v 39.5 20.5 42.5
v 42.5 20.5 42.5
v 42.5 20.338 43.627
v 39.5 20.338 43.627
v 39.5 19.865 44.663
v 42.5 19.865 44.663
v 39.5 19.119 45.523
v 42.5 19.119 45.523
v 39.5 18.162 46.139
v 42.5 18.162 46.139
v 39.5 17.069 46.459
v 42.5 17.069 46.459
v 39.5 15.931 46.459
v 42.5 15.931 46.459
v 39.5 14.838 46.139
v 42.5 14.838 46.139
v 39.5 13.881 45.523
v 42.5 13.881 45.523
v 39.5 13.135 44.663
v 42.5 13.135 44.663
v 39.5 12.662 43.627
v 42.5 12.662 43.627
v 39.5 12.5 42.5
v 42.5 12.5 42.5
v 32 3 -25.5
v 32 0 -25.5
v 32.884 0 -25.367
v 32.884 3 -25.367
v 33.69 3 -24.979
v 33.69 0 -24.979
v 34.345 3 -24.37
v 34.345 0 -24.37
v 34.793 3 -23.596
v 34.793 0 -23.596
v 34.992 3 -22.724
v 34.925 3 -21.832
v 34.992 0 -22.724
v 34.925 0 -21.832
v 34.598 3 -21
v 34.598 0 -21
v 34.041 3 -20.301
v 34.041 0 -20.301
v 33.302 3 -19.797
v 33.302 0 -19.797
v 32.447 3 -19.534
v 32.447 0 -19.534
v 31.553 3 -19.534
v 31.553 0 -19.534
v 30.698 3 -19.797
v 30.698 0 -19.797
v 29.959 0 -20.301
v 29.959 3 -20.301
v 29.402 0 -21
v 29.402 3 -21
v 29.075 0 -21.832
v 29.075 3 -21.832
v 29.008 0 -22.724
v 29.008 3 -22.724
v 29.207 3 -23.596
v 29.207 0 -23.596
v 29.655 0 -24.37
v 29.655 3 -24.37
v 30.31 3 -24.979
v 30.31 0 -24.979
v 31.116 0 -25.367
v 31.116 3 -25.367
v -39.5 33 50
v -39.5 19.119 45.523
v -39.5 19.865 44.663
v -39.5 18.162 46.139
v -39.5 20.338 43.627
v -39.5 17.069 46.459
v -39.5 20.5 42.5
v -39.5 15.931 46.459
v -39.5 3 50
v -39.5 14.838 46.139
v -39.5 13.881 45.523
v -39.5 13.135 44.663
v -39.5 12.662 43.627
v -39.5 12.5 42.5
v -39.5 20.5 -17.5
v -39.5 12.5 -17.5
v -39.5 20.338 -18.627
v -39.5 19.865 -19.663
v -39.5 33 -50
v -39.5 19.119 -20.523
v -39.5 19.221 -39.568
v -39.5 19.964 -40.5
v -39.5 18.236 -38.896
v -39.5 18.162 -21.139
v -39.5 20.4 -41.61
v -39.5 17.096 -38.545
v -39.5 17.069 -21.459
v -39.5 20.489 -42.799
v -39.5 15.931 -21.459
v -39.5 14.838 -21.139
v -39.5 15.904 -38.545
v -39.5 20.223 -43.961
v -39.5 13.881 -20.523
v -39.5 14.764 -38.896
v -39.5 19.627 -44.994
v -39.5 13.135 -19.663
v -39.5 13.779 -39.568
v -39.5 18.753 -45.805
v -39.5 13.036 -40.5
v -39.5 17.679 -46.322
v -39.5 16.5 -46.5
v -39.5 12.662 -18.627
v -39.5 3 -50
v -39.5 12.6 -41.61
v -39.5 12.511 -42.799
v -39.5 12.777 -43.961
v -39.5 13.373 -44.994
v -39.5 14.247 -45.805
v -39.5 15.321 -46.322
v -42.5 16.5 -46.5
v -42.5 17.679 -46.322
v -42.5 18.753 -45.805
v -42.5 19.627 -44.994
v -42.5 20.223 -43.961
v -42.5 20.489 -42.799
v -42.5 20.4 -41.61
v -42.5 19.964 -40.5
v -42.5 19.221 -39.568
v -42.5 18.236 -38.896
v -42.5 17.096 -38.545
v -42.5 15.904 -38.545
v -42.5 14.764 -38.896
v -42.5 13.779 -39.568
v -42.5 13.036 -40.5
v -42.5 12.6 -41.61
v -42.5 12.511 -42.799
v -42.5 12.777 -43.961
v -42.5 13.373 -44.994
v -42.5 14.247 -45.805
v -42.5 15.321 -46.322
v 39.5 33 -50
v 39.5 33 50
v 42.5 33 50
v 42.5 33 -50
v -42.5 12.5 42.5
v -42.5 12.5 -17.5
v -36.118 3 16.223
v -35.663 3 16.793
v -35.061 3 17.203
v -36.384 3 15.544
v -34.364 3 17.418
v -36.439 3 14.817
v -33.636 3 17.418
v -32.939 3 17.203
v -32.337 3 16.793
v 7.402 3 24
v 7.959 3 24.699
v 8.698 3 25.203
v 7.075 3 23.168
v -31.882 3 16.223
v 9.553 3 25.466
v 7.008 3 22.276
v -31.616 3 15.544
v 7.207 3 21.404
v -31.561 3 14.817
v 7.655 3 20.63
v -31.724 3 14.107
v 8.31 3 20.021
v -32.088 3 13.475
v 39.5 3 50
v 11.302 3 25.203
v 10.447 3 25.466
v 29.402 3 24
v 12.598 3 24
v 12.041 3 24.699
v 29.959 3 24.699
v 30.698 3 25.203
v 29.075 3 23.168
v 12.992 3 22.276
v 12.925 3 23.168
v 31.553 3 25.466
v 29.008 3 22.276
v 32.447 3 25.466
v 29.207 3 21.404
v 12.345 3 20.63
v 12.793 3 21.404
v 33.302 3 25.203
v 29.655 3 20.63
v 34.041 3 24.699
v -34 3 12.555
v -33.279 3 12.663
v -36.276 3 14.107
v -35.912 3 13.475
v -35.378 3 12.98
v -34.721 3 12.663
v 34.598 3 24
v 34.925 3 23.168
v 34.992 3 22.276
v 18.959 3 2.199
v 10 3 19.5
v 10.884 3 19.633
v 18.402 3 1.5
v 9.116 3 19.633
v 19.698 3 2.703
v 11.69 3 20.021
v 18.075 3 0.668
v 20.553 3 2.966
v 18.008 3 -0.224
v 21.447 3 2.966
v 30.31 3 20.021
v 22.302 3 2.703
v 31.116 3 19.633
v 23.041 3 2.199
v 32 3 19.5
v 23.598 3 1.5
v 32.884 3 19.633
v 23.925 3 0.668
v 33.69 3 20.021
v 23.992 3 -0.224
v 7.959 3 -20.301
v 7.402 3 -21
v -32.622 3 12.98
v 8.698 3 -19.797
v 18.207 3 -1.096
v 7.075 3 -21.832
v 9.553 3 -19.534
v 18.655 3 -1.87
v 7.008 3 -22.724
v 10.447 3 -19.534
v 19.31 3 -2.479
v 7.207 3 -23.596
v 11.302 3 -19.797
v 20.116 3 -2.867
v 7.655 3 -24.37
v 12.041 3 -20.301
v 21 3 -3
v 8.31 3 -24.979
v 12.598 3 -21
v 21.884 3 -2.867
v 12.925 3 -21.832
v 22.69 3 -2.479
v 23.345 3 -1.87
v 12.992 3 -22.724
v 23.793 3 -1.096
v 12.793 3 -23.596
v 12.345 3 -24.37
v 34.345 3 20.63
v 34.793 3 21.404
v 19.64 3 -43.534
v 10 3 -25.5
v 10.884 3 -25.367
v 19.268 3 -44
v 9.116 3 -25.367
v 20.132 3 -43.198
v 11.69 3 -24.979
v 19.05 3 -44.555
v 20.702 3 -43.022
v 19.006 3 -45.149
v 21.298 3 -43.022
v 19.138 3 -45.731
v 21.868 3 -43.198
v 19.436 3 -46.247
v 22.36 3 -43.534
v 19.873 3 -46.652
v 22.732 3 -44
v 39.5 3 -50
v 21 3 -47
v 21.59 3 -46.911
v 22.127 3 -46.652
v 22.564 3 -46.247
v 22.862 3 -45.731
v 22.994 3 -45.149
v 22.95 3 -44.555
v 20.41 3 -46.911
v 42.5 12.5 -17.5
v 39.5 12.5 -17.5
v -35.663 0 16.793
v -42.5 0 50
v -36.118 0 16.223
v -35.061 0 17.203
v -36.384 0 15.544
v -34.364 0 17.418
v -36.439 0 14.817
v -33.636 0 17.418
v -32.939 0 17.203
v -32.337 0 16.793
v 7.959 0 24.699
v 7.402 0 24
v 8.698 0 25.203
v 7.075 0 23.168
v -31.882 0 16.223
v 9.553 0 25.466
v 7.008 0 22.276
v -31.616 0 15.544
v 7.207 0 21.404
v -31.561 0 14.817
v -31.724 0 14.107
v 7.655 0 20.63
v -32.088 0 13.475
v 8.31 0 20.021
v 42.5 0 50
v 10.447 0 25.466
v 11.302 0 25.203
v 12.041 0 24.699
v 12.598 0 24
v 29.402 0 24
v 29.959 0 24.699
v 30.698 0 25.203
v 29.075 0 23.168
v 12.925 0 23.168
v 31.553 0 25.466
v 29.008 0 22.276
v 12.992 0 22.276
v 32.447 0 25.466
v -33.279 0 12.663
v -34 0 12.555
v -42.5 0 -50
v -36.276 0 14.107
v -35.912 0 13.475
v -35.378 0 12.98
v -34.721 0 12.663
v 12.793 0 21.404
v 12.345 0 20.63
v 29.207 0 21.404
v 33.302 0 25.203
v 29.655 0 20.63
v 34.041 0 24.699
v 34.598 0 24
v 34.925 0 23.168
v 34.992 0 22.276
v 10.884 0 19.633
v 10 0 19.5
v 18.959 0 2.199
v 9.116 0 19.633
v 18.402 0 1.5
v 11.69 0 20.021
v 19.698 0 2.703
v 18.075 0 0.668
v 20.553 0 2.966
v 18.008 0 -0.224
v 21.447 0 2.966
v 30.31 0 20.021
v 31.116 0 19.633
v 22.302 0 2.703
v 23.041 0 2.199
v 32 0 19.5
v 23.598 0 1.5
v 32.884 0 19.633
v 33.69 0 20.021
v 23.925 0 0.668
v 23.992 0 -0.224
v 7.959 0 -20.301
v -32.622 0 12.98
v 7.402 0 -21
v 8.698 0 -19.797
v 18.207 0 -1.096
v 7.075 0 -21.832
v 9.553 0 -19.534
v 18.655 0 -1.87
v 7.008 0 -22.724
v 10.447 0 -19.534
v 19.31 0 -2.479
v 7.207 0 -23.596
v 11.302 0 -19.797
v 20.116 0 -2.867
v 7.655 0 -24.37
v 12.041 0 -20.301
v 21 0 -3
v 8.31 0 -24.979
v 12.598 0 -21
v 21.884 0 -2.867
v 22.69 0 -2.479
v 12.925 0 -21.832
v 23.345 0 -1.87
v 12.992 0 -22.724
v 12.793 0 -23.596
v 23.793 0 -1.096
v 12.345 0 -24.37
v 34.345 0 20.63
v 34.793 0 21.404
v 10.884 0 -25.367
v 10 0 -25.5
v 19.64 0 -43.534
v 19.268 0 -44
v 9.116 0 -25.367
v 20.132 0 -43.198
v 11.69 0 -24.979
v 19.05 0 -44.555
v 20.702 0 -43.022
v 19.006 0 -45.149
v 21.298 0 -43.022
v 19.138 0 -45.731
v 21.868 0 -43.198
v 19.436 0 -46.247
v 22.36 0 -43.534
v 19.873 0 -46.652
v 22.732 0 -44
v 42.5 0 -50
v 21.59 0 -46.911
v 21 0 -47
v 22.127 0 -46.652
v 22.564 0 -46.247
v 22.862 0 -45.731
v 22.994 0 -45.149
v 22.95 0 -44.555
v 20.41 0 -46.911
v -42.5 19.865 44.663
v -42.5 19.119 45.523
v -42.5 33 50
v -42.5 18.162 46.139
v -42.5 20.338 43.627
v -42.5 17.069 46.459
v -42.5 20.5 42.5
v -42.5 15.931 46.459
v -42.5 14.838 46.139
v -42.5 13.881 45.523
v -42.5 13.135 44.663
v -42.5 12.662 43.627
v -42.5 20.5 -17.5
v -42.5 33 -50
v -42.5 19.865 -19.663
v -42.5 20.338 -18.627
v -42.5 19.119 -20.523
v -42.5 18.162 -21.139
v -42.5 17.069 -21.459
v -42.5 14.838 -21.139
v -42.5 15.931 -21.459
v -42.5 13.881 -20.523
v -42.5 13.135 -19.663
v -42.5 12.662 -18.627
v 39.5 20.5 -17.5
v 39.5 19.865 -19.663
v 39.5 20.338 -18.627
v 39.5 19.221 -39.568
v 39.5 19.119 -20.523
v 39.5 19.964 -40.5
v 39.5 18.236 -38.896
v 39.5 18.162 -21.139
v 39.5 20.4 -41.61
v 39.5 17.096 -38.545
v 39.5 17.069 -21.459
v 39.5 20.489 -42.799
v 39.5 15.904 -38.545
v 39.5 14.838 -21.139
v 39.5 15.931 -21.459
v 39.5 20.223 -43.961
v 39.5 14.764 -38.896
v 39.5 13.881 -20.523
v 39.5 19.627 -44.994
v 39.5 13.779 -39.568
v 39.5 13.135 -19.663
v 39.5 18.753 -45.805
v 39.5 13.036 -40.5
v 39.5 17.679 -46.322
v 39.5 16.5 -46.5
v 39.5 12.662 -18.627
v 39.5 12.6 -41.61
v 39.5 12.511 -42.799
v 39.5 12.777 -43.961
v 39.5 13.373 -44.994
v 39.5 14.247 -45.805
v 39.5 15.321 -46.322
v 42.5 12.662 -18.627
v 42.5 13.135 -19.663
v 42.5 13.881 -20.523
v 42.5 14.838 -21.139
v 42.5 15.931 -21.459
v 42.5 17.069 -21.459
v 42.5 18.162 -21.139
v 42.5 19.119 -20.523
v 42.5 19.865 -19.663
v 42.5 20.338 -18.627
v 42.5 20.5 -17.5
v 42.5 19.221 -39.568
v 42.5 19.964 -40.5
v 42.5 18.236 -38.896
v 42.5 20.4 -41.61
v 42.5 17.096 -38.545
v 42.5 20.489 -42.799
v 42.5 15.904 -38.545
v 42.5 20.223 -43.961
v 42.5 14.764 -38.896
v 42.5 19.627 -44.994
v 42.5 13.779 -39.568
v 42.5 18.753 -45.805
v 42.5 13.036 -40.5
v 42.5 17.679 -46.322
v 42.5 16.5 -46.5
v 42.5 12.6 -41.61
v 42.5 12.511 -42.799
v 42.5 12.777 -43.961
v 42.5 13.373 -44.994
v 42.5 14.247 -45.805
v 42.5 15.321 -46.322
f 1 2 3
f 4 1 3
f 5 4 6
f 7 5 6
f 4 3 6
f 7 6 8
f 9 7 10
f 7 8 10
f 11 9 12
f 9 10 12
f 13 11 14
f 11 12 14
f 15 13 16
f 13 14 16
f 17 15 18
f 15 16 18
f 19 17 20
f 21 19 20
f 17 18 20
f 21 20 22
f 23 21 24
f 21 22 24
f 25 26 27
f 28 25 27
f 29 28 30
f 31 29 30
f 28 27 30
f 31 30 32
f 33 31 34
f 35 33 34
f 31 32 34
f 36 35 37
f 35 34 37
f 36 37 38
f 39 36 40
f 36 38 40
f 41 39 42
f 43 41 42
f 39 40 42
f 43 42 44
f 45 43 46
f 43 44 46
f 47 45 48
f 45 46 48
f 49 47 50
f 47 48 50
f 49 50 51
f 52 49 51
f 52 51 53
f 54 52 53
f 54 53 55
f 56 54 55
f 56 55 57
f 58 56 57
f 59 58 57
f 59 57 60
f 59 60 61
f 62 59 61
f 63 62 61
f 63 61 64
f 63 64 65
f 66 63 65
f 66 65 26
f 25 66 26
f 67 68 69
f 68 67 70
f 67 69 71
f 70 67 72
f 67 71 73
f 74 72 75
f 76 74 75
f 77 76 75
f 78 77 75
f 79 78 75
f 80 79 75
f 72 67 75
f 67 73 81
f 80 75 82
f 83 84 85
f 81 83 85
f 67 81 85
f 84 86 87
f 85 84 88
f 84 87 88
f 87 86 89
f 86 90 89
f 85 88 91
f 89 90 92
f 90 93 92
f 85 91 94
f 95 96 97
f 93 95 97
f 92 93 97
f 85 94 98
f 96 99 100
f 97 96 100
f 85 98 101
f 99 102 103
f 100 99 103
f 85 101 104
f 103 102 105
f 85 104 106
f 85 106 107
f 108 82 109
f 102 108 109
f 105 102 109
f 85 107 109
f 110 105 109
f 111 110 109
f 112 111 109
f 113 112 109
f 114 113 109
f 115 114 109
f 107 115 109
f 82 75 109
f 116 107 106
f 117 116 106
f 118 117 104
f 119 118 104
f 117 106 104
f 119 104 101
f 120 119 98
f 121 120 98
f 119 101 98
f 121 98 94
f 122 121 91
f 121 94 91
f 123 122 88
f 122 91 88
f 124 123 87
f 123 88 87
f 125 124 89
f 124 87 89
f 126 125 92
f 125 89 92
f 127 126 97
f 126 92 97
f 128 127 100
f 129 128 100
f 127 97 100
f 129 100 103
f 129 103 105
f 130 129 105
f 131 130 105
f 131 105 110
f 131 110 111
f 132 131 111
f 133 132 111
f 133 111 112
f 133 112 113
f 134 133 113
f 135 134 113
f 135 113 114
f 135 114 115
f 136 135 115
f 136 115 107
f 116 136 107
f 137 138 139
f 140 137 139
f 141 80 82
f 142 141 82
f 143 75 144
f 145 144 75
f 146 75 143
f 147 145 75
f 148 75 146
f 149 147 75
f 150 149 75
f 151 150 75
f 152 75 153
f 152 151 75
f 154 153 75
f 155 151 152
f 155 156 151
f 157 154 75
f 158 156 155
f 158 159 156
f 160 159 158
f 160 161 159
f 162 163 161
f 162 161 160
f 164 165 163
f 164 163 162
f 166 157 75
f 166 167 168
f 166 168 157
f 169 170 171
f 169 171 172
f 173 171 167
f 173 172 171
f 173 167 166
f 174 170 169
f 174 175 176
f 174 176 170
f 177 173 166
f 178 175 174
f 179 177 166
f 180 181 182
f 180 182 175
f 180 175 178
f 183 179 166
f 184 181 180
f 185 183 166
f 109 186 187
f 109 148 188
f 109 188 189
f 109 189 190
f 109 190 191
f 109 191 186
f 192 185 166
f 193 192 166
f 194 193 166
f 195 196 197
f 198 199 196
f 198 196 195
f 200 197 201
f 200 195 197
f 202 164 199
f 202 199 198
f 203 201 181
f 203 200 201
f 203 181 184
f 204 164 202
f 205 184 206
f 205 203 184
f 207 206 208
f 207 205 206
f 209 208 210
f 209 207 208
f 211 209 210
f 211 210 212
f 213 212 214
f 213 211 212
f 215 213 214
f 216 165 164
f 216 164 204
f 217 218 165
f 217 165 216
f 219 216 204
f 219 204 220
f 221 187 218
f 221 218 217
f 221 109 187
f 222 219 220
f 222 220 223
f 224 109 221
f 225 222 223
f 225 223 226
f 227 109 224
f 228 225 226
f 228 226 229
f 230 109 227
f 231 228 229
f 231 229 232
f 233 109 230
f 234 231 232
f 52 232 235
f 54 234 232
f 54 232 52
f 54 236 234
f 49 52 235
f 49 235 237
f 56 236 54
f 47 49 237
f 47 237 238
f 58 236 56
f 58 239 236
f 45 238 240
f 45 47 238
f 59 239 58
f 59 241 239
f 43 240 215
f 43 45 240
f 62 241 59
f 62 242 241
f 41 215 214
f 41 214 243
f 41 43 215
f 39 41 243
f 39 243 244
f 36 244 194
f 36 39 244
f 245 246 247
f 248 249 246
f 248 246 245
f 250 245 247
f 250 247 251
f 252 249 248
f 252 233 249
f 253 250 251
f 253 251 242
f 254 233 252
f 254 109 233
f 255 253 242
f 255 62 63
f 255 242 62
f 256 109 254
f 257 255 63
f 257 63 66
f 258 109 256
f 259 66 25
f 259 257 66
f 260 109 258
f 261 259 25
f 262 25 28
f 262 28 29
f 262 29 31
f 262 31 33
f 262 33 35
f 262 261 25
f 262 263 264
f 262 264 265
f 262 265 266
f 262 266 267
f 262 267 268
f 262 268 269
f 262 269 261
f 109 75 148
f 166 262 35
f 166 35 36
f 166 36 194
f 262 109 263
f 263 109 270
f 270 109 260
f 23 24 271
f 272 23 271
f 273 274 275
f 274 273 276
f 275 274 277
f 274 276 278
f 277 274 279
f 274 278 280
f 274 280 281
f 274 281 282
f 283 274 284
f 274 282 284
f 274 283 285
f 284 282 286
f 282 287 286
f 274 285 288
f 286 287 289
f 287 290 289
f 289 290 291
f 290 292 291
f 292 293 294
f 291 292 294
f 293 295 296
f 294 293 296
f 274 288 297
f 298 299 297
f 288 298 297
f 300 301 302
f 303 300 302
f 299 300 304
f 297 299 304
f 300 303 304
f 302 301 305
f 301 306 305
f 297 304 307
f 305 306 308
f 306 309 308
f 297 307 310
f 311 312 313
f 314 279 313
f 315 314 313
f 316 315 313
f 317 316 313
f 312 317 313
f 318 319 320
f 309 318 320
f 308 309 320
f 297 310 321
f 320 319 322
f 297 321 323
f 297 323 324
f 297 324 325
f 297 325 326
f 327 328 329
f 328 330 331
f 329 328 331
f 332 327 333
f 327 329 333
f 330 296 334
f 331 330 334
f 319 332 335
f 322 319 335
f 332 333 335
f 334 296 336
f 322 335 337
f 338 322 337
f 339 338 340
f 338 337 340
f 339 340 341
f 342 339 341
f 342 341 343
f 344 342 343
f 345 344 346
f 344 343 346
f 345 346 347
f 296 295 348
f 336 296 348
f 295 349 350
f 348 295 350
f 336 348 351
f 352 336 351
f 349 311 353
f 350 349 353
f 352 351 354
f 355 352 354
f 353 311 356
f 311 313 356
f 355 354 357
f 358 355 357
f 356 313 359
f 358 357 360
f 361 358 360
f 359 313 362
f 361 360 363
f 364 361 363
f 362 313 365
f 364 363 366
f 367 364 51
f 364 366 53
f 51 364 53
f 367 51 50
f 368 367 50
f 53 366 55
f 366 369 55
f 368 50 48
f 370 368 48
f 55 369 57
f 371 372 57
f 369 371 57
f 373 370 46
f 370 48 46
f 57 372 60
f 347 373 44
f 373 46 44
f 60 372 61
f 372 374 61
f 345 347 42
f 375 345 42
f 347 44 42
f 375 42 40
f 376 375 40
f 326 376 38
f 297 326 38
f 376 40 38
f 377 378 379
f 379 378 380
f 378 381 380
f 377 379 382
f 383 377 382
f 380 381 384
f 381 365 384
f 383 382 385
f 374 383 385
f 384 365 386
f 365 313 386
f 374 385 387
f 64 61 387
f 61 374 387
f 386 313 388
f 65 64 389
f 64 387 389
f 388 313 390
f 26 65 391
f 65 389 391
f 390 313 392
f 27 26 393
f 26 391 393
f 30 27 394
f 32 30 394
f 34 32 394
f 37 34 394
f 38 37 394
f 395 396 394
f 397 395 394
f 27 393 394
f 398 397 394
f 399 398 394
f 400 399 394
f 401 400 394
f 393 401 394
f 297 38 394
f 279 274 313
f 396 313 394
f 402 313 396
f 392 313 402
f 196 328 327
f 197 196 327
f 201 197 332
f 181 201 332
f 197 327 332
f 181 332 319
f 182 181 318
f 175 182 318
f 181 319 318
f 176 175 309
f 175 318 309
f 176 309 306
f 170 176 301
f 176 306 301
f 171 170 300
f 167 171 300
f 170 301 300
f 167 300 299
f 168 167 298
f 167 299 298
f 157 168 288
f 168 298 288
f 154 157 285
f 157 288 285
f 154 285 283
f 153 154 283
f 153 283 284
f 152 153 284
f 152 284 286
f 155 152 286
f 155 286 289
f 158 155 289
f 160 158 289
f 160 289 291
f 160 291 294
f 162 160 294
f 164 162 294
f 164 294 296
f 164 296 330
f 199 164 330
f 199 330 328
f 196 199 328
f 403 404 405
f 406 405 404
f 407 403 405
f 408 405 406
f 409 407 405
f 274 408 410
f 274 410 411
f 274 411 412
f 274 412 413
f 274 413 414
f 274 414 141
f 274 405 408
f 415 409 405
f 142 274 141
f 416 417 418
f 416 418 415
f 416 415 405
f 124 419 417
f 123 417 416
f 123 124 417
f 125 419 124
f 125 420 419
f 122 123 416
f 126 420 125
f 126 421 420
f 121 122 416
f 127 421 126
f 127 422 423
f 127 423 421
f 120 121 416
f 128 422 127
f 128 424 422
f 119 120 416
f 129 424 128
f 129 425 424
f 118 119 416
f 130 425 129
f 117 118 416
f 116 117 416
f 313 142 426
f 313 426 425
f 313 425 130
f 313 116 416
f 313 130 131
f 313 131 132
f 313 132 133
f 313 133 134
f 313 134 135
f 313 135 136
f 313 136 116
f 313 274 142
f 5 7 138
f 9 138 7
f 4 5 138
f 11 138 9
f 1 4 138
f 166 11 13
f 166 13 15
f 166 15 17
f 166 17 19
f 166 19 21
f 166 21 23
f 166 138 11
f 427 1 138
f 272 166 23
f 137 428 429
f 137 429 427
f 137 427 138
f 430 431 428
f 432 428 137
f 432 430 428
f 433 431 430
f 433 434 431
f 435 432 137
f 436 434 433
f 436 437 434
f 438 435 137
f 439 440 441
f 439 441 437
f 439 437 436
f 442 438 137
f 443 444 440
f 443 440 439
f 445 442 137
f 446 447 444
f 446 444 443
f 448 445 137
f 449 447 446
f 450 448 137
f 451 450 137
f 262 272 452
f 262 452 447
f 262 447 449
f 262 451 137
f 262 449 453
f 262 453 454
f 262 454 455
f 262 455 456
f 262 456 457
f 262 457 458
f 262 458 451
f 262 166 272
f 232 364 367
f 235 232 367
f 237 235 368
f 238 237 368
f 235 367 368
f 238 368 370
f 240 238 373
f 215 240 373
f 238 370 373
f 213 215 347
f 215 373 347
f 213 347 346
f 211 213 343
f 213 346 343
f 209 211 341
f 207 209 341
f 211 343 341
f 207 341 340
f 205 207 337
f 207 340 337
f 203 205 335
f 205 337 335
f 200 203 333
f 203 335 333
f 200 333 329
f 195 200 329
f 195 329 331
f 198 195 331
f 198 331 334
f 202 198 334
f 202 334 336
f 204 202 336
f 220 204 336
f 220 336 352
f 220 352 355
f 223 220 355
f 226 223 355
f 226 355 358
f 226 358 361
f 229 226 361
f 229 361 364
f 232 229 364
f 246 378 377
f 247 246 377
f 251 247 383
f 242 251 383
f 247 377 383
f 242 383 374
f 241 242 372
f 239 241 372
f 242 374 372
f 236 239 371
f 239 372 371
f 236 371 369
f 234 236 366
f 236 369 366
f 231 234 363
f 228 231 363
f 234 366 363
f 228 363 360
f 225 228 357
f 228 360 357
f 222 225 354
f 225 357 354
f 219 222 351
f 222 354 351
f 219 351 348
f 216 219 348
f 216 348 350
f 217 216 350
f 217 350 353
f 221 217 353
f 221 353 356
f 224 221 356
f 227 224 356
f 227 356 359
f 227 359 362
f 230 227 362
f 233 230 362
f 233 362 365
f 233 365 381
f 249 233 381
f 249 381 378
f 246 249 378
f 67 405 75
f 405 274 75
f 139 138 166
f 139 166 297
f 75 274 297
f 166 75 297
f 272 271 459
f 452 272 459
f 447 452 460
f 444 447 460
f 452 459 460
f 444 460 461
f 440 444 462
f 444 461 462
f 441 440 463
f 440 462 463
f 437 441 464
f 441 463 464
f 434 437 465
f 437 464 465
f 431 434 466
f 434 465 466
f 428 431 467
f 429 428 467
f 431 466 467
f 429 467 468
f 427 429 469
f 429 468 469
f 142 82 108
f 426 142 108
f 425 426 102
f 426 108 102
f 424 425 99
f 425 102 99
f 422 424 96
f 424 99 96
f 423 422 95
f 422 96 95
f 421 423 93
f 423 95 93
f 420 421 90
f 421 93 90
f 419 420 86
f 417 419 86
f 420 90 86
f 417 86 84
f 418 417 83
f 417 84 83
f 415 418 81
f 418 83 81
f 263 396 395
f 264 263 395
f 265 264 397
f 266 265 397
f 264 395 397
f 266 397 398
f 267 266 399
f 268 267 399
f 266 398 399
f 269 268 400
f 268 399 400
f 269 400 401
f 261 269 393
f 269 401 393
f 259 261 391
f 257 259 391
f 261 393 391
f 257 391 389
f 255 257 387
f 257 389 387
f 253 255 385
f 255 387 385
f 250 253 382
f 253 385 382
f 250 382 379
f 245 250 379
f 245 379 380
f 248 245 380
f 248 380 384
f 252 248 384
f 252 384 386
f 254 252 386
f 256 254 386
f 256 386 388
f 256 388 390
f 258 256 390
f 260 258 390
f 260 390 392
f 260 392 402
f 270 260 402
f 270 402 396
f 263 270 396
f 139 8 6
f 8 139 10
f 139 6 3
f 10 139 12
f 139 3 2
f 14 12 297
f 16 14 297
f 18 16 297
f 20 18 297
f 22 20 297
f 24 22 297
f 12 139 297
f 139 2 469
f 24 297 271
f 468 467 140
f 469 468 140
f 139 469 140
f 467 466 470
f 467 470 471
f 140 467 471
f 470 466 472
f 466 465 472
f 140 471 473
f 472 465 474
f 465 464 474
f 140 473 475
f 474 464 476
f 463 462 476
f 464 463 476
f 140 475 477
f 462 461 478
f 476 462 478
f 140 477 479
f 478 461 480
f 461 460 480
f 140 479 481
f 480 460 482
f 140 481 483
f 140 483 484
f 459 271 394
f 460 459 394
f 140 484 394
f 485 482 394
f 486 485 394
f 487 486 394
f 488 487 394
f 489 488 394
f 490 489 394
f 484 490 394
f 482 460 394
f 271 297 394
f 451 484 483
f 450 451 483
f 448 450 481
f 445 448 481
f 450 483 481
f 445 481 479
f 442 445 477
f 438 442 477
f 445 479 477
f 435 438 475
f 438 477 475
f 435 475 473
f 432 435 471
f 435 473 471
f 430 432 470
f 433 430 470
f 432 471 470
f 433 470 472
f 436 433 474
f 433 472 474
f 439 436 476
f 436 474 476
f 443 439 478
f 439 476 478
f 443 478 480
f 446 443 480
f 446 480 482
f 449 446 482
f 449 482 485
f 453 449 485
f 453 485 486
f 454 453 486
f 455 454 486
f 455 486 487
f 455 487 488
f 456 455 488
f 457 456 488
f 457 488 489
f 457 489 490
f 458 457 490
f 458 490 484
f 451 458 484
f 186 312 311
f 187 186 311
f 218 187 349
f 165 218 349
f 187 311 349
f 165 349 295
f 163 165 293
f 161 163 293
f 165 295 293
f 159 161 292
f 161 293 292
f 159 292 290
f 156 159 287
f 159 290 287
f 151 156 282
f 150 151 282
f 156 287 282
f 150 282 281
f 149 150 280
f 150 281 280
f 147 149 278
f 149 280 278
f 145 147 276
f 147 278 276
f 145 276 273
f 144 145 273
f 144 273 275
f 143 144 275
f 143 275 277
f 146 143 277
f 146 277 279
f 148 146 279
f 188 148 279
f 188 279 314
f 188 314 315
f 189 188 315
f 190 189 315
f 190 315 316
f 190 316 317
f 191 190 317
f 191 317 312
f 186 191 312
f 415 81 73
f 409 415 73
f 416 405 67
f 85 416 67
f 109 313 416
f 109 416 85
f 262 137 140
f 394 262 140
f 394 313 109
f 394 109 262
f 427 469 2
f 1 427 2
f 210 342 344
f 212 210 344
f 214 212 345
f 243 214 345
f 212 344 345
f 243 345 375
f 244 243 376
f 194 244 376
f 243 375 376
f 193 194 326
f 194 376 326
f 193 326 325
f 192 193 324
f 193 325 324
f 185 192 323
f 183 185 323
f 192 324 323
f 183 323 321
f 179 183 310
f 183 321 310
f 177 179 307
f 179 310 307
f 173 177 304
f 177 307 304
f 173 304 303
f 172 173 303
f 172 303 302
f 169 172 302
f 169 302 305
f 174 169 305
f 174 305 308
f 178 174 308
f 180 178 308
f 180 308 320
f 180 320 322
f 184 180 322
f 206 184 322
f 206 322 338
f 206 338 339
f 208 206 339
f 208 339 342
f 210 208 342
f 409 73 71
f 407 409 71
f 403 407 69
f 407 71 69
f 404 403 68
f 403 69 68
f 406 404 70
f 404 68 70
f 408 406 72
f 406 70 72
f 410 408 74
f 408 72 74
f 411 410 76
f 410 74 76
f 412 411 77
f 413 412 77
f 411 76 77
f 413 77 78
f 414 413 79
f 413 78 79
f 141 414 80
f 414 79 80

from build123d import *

# Parameters (mm, degrees)
SKETCH_1_W          = 85
SKETCH_1_H          = 100
EXTRUDE_1_DEPTH     = 3
SKETCH_2_W          = 3
SKETCH_2_H          = 100
EXTRUDE_2_DEPTH     = 30
CUT_EXTRUDE_1_REACH = 105.99
SKETCH_3_R          = 4
SKETCH_4_R          = 3
SKETCH_4_R_2        = 2
SKETCH_4_R_3        = 2.445405454
CUT_EXTRUDE_3_DEPTH = 74.452365517


with BuildPart() as part:
    # 草图1 → 凸台-拉伸1 (new body)
    with BuildSketch(Plane(origin=(0, 0, 0), x_dir=(1, 0, 0), z_dir=(0, 1, 0))):
        Rectangle(SKETCH_1_W, SKETCH_1_H)
    extrude(amount=EXTRUDE_1_DEPTH)

    # 草图2 → 凸台-拉伸2 (add)
    with BuildSketch(Plane(origin=(0, 3, 0), x_dir=(1, 0, 0), z_dir=(0, 1, 0))):
        with Locations((-41, 0)):
            Rectangle(SKETCH_2_W, SKETCH_2_H)
        with Locations((41, 0)):
            Rectangle(SKETCH_2_W, SKETCH_2_H)
    extrude(amount=EXTRUDE_2_DEPTH)

    # 切除-拉伸1: up to this face of the body (flat: up to its plane)
    cut_extrude_1_end = Plane(part.part.faces().sort_by_distance((-42.5, 16.5, 0))[0])
    # 草图3 → 切除-拉伸1 (cut, up to the picked face)
    with BuildSketch(Plane(origin=(42.5, 0, 0), x_dir=(0, 0, -1), z_dir=(1, 0, 0)), mode=Mode.PRIVATE) as cut_extrude_1_sk1:
        with Locations((42.5, 16.5)):
            Circle(SKETCH_3_R)
    cut_extrude_1_tool1 = split(extrude(cut_extrude_1_sk1.sketch, amount=-CUT_EXTRUDE_1_REACH, mode=Mode.PRIVATE), bisect_by=cut_extrude_1_end, keep=Keep.BOTH, mode=Mode.PRIVATE)
    # 草图3 → 切除-拉伸1 (cut, up to the picked face)
    with BuildSketch(Plane(origin=(42.5, 0, 0), x_dir=(0, 0, -1), z_dir=(1, 0, 0)), mode=Mode.PRIVATE) as cut_extrude_1_sk2:
        with BuildLine():
            Line((-42.5, 12.5), (17.5, 12.5))
            ThreePointArc((17.5, 12.5), (21.5, 16.5), (17.5, 20.5))
            Line((17.5, 20.5), (-42.5, 20.5))
            ThreePointArc((-42.5, 20.5), (-46.5, 16.5), (-42.5, 12.5))
        make_face()
    cut_extrude_1_tool2 = split(extrude(cut_extrude_1_sk2.sketch, amount=-CUT_EXTRUDE_1_REACH, mode=Mode.PRIVATE), bisect_by=cut_extrude_1_end, keep=Keep.BOTH, mode=Mode.PRIVATE)
    add(cut_extrude_1_tool1.solids().sort_by(Axis((42.5, 16.5, -42.5), (-1, 0, 0)))[0], mode=Mode.SUBTRACT)
    add(cut_extrude_1_tool2.solids().sort_by(Axis((42.5, 16.5, 12.5), (-1, 0, 0)))[0], mode=Mode.SUBTRACT)

    # 草图4 → 切除-拉伸3 (cut, through all)
    with BuildSketch(Plane.XZ):
        with Locations(Location((21, 0, 0), (0, 0, 270))):
            Circle(SKETCH_4_R)
        with Locations(Location((10, -22.5, 0), (0, 0, 270))):
            Circle(SKETCH_4_R)
        with Locations(Location((32, -22.5, 0), (0, 0, 270))):
            Circle(SKETCH_4_R)
        with Locations(Location((10, 22.5, 0), (0, 0, 270))):
            Circle(SKETCH_4_R)
        with Locations(Location((32, 22.5, 0), (0, 0, 270))):
            Circle(SKETCH_4_R)
        with Locations(Location((21, -45, 0), (0, 0, 270))):
            Circle(SKETCH_4_R_2)
        with Locations(Location((-34, 15, 0), (0, 0, 270))):
            Circle(SKETCH_4_R_3)
    extrude(amount=-CUT_EXTRUDE_3_DEPTH, mode=Mode.SUBTRACT)


solid = part.part
